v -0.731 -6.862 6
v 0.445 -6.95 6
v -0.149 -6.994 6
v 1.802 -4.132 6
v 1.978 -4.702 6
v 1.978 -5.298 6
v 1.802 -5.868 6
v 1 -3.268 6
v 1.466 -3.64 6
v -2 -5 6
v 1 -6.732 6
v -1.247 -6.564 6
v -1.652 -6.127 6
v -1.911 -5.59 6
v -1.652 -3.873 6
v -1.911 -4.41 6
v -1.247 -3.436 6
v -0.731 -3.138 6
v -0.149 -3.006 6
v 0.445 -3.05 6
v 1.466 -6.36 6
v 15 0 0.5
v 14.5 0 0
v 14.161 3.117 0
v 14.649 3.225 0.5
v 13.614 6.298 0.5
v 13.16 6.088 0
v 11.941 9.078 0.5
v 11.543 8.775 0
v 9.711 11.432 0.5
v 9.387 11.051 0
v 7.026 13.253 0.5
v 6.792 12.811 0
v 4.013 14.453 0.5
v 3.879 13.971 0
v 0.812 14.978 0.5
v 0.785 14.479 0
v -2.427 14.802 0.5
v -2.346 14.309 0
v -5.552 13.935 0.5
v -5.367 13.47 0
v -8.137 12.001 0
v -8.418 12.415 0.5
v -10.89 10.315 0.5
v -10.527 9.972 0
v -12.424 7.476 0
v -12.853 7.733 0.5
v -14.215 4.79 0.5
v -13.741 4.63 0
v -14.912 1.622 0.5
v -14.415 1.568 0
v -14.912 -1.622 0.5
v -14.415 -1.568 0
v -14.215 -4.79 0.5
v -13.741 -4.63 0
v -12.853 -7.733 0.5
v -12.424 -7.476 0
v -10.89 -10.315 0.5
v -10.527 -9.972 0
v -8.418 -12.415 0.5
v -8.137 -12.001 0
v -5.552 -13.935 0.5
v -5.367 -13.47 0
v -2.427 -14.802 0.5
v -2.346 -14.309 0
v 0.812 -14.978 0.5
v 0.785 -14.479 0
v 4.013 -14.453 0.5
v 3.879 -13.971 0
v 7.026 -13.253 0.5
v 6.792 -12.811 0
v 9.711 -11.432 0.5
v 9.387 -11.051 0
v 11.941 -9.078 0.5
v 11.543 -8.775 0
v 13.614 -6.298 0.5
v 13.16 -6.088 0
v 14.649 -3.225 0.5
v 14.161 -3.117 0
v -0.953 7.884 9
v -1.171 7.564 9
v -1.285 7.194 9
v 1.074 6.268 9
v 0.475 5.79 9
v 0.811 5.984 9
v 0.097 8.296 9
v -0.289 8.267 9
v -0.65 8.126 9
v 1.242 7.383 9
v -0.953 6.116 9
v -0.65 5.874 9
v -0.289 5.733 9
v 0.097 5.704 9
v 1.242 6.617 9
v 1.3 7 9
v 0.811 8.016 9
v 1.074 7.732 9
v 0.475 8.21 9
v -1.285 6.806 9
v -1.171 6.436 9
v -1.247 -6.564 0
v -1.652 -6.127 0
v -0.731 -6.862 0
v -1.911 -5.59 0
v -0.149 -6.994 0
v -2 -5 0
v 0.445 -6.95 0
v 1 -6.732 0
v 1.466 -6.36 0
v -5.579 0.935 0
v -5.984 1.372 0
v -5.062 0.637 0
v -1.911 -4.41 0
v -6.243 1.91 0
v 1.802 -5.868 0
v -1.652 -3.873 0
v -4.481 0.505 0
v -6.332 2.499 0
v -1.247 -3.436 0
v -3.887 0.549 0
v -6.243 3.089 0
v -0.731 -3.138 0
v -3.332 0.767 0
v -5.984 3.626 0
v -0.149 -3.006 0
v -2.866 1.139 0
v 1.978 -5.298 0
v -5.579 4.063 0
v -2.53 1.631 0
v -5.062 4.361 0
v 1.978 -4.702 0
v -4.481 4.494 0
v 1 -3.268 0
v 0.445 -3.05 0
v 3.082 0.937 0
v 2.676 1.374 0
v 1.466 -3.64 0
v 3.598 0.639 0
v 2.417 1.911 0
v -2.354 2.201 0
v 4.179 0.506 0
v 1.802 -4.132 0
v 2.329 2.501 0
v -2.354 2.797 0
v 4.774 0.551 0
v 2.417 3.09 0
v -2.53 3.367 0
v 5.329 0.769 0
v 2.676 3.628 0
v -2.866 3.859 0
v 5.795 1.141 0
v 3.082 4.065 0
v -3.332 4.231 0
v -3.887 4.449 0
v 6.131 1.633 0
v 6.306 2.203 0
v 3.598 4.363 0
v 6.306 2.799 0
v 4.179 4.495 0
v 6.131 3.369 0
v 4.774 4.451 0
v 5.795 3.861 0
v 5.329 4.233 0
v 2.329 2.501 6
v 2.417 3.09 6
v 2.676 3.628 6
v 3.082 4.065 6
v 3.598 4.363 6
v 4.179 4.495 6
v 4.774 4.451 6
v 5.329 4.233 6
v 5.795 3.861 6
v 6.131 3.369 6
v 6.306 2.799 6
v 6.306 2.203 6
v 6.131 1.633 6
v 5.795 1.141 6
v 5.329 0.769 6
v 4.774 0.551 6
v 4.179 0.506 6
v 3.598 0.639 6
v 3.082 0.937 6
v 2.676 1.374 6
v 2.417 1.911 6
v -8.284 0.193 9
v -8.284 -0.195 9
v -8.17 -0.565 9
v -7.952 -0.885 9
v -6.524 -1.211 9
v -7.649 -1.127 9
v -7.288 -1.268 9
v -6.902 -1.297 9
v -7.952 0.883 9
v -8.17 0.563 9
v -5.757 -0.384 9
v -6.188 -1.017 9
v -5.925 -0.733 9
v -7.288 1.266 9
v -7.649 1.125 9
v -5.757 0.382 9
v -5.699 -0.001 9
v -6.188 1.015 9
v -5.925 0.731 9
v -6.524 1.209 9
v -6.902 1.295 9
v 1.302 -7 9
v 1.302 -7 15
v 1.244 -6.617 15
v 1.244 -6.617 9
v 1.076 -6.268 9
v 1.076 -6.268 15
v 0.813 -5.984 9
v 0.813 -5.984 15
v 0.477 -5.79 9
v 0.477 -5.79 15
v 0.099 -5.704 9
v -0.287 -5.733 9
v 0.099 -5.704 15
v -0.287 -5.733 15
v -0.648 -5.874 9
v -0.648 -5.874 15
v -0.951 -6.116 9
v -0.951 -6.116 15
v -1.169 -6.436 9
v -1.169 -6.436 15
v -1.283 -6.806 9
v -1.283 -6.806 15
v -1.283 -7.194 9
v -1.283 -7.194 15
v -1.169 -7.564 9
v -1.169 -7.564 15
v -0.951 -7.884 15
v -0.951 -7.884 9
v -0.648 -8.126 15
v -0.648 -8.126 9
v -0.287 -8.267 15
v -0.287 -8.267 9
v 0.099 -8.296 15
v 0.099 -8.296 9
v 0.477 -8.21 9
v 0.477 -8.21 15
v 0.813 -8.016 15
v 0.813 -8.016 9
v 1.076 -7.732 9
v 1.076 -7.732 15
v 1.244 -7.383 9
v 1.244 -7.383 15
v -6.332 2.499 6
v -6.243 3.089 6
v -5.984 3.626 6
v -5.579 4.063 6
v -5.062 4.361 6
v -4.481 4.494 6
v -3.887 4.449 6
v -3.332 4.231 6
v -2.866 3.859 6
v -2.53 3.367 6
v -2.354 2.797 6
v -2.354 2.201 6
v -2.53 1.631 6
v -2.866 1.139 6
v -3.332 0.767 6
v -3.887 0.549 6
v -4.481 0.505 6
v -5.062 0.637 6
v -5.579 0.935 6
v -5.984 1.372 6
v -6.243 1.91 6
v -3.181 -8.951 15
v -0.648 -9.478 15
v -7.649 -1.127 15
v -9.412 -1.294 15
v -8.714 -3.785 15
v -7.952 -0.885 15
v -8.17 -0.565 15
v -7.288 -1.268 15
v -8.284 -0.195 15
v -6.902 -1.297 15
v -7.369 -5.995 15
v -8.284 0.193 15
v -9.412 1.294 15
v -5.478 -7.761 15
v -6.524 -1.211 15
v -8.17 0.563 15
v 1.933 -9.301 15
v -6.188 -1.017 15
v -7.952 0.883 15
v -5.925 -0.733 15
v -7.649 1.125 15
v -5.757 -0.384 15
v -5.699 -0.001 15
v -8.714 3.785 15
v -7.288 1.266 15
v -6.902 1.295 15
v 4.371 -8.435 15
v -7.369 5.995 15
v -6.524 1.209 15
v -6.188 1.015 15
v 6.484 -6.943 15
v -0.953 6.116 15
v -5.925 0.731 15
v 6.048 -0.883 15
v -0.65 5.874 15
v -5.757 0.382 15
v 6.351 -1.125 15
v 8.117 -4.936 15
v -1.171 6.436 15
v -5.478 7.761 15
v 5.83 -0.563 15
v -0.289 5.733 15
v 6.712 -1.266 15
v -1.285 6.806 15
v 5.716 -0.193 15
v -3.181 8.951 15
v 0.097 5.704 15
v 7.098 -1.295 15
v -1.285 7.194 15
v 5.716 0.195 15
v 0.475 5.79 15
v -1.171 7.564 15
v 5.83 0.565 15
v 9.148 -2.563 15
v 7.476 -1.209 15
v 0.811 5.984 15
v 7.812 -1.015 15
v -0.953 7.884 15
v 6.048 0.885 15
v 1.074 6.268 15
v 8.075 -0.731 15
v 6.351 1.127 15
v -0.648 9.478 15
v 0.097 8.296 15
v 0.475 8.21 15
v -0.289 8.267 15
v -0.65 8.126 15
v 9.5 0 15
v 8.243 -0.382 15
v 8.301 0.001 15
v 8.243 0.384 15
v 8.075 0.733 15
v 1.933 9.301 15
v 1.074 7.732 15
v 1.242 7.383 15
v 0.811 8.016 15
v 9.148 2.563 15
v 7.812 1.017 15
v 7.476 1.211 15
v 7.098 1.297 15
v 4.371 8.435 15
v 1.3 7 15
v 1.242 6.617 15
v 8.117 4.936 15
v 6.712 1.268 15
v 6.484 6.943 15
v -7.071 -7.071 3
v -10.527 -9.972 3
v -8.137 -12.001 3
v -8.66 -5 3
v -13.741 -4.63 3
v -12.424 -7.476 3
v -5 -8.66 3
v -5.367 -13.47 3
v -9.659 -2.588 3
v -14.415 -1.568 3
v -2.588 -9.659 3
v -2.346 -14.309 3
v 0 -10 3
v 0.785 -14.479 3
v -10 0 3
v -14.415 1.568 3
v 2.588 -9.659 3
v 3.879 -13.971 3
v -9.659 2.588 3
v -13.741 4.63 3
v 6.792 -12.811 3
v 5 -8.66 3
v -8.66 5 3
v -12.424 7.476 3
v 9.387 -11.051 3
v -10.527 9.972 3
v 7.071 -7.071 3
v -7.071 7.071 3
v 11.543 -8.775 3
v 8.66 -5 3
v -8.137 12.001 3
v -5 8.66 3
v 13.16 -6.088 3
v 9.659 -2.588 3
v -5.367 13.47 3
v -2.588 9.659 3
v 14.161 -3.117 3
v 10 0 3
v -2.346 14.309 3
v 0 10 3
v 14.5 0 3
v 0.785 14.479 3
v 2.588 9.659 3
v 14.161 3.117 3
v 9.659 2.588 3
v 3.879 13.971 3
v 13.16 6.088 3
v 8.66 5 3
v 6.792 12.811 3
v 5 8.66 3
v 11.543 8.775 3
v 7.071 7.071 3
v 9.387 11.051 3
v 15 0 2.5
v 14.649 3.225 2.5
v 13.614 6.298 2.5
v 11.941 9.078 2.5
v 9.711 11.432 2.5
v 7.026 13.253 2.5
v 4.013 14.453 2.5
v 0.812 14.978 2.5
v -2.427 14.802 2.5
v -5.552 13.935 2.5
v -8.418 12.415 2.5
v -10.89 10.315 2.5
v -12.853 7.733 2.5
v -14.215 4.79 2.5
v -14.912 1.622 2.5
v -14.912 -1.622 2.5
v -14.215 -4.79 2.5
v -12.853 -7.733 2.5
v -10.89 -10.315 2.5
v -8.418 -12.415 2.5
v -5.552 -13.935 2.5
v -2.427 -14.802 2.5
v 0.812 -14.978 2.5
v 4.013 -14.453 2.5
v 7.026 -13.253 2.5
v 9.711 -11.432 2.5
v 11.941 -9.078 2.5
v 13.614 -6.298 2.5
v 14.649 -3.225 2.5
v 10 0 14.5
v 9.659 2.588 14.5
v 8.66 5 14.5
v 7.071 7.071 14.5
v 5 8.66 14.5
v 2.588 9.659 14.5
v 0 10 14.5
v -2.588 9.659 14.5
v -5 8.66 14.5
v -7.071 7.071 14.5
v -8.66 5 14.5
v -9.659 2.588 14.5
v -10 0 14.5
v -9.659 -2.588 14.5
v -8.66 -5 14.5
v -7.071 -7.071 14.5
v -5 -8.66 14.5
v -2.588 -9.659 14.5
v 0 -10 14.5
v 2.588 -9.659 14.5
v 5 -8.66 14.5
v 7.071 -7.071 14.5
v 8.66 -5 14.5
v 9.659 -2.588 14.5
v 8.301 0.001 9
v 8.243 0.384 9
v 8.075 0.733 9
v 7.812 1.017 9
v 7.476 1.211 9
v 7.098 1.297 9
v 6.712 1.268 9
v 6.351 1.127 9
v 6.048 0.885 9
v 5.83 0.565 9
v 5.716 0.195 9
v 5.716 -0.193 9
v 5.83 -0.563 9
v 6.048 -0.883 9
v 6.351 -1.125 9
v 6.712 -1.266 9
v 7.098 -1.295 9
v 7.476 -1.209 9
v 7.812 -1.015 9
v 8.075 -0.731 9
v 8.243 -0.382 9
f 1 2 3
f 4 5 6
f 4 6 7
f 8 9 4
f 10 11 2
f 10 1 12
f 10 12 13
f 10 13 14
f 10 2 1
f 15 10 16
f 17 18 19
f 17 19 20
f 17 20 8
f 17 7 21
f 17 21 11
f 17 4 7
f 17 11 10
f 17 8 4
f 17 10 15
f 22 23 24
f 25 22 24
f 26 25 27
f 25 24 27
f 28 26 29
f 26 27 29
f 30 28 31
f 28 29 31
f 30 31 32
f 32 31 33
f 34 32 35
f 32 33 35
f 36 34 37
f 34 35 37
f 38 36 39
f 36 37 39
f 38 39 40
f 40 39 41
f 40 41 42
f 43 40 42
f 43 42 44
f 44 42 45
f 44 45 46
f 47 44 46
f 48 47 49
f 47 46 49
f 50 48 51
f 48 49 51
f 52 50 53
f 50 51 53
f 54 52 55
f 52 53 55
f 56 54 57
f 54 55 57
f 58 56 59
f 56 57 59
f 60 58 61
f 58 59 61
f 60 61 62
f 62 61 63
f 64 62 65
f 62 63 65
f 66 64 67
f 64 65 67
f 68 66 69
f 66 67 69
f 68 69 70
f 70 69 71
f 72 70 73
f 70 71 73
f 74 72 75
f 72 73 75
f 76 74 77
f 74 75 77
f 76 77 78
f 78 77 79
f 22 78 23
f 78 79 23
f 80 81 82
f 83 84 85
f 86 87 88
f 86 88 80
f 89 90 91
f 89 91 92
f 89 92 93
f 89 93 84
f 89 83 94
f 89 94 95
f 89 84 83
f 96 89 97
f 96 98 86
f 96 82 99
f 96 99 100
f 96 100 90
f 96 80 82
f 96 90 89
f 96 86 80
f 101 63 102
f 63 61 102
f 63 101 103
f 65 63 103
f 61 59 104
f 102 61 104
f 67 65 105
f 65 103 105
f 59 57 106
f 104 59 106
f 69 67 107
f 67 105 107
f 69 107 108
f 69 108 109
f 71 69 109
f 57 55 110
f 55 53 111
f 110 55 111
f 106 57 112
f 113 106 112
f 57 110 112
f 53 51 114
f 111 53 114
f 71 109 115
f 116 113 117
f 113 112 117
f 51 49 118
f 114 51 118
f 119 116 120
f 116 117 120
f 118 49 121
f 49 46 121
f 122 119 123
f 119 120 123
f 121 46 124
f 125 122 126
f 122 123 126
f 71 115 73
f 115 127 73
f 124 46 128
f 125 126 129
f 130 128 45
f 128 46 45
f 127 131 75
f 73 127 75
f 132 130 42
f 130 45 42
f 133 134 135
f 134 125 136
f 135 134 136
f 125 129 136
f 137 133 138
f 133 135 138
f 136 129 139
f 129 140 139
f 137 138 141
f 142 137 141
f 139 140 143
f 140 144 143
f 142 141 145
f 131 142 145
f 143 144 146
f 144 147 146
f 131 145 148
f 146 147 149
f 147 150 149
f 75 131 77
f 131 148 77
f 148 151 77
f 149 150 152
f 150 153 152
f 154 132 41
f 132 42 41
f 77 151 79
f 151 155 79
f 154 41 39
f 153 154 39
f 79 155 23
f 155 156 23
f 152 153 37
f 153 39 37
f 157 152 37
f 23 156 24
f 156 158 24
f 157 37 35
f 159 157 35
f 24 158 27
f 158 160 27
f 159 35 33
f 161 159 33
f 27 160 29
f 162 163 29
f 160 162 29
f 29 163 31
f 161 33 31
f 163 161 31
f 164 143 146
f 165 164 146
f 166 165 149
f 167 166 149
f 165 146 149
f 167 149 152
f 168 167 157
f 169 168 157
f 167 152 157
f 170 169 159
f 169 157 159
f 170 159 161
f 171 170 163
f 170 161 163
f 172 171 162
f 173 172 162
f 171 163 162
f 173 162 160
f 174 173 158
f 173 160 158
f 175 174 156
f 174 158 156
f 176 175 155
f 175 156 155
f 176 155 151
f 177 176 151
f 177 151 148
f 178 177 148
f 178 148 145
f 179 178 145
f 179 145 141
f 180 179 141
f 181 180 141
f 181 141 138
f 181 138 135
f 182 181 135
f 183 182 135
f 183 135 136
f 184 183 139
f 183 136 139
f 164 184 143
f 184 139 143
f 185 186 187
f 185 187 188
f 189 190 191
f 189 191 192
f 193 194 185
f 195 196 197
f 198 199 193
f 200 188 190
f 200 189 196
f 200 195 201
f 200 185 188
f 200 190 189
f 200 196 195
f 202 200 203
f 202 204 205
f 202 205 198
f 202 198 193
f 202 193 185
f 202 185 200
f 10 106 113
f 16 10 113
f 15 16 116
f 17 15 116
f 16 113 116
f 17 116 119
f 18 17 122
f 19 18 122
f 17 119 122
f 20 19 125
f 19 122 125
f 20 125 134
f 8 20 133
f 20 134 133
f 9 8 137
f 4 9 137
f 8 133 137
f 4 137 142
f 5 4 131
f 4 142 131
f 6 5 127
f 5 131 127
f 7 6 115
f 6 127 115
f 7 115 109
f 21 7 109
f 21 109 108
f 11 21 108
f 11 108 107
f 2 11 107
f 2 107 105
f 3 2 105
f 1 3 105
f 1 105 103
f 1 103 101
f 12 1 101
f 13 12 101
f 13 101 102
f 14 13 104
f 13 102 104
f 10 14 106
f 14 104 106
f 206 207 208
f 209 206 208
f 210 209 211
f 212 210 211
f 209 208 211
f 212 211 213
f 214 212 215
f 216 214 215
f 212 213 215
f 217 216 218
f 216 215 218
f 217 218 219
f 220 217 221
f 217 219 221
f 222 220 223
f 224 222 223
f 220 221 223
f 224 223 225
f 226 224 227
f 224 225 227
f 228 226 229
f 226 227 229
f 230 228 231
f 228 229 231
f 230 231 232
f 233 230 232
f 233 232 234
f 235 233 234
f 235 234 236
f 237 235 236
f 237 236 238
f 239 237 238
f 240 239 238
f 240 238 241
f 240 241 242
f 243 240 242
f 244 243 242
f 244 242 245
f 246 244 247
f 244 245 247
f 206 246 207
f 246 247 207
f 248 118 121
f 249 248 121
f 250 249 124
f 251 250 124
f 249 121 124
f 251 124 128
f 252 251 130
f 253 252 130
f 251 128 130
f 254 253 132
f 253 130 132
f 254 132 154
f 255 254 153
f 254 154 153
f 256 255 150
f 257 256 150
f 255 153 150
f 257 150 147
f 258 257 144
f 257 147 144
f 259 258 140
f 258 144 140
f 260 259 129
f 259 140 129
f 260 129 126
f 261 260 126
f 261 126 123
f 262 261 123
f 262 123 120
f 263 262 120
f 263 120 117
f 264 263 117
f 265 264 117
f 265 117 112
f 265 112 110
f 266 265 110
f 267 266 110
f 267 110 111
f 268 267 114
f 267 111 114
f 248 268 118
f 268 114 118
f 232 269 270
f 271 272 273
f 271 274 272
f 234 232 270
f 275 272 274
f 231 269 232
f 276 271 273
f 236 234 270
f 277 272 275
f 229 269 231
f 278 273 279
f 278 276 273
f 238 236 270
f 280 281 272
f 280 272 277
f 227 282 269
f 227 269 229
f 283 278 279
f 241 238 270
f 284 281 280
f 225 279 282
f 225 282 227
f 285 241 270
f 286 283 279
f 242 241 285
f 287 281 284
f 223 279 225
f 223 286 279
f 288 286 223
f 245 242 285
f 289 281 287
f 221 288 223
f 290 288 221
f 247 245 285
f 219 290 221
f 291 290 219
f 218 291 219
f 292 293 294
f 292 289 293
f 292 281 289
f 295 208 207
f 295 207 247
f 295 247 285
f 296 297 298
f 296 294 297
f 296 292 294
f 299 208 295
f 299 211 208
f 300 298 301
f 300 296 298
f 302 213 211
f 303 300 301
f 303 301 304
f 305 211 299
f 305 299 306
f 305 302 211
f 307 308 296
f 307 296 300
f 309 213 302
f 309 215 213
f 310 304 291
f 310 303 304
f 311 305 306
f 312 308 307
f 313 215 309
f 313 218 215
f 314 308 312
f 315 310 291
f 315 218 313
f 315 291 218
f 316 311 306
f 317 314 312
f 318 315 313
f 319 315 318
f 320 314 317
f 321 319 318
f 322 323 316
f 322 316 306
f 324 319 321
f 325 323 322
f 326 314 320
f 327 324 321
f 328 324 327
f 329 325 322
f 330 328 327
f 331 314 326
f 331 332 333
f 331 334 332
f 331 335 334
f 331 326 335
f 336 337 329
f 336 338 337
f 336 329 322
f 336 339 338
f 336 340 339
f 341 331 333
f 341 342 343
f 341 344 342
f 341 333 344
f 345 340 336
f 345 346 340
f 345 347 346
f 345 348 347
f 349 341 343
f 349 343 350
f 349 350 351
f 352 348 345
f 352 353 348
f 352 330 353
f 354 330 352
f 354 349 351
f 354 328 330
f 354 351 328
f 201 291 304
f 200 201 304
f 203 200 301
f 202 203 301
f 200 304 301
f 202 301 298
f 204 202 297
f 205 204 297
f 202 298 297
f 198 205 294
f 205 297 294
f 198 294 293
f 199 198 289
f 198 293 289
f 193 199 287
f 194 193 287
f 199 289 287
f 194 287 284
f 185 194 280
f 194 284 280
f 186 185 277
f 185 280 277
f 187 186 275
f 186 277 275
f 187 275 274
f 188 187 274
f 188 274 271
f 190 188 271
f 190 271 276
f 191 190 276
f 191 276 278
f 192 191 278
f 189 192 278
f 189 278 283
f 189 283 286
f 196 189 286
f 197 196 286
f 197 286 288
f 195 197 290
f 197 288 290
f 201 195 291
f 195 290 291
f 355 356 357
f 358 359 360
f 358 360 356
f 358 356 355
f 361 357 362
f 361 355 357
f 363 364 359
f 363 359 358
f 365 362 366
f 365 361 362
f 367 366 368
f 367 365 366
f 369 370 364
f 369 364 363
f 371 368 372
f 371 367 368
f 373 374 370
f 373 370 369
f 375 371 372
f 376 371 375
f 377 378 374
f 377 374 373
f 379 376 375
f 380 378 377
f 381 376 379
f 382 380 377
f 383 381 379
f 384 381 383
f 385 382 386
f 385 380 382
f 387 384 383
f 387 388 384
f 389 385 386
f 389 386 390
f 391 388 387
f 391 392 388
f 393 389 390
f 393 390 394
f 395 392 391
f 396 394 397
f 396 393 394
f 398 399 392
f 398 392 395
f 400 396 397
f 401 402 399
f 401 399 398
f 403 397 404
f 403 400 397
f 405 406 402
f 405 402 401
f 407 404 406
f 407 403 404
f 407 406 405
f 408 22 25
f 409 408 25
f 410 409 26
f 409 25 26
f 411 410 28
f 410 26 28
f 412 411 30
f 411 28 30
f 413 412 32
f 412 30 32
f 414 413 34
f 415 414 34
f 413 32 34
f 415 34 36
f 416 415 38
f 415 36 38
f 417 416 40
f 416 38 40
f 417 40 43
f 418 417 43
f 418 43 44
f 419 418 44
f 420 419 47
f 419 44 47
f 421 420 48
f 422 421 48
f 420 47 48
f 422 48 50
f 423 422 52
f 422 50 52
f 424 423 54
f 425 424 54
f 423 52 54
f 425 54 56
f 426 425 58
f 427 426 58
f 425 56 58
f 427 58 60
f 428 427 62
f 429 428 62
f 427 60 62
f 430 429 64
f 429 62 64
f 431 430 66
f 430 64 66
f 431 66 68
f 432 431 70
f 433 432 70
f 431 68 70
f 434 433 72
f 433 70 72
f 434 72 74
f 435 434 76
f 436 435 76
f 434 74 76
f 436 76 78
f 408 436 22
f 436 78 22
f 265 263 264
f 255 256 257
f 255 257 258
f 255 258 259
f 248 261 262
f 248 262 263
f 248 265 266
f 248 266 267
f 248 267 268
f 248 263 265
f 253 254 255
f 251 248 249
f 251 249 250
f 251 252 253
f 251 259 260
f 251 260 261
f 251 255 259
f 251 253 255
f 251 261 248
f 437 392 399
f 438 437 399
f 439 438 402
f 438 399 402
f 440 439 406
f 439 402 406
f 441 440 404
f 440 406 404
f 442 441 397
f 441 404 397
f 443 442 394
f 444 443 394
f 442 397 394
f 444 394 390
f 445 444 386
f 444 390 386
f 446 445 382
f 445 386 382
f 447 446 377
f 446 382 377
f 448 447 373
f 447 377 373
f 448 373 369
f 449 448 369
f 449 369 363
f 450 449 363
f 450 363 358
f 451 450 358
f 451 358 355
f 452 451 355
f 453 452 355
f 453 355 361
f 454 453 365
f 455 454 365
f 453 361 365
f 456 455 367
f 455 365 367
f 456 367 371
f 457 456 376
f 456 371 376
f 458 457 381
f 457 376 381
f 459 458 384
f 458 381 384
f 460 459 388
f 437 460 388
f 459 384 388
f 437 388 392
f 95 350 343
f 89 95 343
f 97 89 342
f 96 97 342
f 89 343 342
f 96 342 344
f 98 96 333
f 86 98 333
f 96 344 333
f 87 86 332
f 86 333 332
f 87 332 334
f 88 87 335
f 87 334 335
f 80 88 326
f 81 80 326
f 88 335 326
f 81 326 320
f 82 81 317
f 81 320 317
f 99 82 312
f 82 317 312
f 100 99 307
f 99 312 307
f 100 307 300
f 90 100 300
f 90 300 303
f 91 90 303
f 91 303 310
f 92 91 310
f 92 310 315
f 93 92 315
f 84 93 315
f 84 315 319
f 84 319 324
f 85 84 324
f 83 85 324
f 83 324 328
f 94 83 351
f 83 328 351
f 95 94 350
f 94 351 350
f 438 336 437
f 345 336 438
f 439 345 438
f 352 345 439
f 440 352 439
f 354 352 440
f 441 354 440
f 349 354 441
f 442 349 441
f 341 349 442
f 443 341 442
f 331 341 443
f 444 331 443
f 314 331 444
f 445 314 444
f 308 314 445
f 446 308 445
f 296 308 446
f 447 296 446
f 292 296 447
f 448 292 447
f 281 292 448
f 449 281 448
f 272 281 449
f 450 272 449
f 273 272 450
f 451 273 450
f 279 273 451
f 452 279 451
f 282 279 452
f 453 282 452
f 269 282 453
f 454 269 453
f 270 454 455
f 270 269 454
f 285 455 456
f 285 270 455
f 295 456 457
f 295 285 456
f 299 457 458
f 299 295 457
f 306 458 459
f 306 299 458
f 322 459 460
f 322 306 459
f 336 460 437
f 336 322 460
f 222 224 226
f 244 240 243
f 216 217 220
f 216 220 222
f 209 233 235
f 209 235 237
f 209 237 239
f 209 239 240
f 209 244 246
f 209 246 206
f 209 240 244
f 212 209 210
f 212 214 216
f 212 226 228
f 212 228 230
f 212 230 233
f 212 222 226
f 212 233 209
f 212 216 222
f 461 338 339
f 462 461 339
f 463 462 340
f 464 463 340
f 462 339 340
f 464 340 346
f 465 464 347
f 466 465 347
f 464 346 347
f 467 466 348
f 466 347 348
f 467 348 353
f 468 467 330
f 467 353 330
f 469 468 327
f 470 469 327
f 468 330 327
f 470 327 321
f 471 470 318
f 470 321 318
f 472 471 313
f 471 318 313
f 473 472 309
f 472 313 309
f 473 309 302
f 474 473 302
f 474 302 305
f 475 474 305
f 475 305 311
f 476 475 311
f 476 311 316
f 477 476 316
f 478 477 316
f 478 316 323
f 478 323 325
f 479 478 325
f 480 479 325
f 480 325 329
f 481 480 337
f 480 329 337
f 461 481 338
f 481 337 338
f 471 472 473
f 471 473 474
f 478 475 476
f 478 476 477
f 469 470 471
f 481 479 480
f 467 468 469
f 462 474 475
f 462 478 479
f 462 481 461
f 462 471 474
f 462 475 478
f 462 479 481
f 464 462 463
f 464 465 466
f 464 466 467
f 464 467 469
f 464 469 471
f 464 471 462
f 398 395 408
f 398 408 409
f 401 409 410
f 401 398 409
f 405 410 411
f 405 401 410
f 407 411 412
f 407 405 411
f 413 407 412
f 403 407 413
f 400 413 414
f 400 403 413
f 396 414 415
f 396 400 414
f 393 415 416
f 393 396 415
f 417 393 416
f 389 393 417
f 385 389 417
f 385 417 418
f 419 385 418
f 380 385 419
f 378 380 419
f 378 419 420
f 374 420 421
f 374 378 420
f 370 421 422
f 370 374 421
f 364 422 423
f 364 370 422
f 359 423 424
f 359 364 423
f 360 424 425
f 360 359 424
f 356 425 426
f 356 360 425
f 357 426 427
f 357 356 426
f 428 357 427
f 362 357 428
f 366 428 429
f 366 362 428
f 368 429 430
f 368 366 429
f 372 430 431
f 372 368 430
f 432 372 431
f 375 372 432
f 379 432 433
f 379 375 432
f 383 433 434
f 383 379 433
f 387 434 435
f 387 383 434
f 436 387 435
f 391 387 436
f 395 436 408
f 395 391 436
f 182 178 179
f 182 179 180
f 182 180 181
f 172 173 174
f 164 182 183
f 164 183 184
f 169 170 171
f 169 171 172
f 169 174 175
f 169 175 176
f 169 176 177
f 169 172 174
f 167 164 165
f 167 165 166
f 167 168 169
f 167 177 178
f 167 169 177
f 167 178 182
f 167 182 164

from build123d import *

# Parameters (mm, degrees)
SKETCH_1_R          = 15
EXTRUDE_1_DEPTH     = 3
SKETCH_2_R          = 10
EXTRUDE_2_DEPTH     = 12
SKETCH_3_R          = 1.3
CUT_EXTRUDE_1_DEPTH = 6
SKETCH_4_R          = 2
CUT_EXTRUDE_2_DEPTH = 6
CHAMFER_1_SIZE      = 0.5


with BuildPart() as part:
    # 草图1 → 凸台-拉伸1 (new body)
    with BuildSketch(Plane.XY):
        Circle(SKETCH_1_R)
    extrude(amount=EXTRUDE_1_DEPTH)

    # 草图2 → 凸台-拉伸2 (add)
    with BuildSketch(Plane.XY.offset(3)):
        Circle(SKETCH_2_R)
    extrude(amount=EXTRUDE_2_DEPTH)

    # 草图3 → 切除-拉伸1 (cut)
    with BuildSketch(Plane.XY.offset(15)):
        with Locations((-6.999, -0.001)):
            Circle(SKETCH_3_R)
        with Locations((0, 7)):
            Circle(SKETCH_3_R)
        with Locations((0.002, -7)):
            Circle(SKETCH_3_R)
        with Locations((7.001, 0.001)):
            Circle(SKETCH_3_R)
    extrude(amount=-CUT_EXTRUDE_1_DEPTH, mode=Mode.SUBTRACT)

    # 草图4 → 切除-拉伸2 (cut)
    with BuildSketch(Plane(origin=(0, 0, 0), x_dir=(-1, 0, 0), z_dir=(0, 0, -1))):
        with Locations((0, -5)):
            Circle(SKETCH_4_R)
        with Locations((-4.328627019, 2.500866025)):
            Circle(SKETCH_4_R)
        with Locations((4.331627019, 2.499133975)):
            Circle(SKETCH_4_R)
    extrude(amount=-CUT_EXTRUDE_2_DEPTH, mode=Mode.SUBTRACT)

    # 倒角1
    chamfer_1_edges = [part.edges().sort_by_distance(p)[0] for p in [
        (-15, 0, 0),
        (-15, 0, 3),
        (-10, 0, 15),
    ]]
    chamfer(chamfer_1_edges, length=CHAMFER_1_SIZE)


solid = part.part
